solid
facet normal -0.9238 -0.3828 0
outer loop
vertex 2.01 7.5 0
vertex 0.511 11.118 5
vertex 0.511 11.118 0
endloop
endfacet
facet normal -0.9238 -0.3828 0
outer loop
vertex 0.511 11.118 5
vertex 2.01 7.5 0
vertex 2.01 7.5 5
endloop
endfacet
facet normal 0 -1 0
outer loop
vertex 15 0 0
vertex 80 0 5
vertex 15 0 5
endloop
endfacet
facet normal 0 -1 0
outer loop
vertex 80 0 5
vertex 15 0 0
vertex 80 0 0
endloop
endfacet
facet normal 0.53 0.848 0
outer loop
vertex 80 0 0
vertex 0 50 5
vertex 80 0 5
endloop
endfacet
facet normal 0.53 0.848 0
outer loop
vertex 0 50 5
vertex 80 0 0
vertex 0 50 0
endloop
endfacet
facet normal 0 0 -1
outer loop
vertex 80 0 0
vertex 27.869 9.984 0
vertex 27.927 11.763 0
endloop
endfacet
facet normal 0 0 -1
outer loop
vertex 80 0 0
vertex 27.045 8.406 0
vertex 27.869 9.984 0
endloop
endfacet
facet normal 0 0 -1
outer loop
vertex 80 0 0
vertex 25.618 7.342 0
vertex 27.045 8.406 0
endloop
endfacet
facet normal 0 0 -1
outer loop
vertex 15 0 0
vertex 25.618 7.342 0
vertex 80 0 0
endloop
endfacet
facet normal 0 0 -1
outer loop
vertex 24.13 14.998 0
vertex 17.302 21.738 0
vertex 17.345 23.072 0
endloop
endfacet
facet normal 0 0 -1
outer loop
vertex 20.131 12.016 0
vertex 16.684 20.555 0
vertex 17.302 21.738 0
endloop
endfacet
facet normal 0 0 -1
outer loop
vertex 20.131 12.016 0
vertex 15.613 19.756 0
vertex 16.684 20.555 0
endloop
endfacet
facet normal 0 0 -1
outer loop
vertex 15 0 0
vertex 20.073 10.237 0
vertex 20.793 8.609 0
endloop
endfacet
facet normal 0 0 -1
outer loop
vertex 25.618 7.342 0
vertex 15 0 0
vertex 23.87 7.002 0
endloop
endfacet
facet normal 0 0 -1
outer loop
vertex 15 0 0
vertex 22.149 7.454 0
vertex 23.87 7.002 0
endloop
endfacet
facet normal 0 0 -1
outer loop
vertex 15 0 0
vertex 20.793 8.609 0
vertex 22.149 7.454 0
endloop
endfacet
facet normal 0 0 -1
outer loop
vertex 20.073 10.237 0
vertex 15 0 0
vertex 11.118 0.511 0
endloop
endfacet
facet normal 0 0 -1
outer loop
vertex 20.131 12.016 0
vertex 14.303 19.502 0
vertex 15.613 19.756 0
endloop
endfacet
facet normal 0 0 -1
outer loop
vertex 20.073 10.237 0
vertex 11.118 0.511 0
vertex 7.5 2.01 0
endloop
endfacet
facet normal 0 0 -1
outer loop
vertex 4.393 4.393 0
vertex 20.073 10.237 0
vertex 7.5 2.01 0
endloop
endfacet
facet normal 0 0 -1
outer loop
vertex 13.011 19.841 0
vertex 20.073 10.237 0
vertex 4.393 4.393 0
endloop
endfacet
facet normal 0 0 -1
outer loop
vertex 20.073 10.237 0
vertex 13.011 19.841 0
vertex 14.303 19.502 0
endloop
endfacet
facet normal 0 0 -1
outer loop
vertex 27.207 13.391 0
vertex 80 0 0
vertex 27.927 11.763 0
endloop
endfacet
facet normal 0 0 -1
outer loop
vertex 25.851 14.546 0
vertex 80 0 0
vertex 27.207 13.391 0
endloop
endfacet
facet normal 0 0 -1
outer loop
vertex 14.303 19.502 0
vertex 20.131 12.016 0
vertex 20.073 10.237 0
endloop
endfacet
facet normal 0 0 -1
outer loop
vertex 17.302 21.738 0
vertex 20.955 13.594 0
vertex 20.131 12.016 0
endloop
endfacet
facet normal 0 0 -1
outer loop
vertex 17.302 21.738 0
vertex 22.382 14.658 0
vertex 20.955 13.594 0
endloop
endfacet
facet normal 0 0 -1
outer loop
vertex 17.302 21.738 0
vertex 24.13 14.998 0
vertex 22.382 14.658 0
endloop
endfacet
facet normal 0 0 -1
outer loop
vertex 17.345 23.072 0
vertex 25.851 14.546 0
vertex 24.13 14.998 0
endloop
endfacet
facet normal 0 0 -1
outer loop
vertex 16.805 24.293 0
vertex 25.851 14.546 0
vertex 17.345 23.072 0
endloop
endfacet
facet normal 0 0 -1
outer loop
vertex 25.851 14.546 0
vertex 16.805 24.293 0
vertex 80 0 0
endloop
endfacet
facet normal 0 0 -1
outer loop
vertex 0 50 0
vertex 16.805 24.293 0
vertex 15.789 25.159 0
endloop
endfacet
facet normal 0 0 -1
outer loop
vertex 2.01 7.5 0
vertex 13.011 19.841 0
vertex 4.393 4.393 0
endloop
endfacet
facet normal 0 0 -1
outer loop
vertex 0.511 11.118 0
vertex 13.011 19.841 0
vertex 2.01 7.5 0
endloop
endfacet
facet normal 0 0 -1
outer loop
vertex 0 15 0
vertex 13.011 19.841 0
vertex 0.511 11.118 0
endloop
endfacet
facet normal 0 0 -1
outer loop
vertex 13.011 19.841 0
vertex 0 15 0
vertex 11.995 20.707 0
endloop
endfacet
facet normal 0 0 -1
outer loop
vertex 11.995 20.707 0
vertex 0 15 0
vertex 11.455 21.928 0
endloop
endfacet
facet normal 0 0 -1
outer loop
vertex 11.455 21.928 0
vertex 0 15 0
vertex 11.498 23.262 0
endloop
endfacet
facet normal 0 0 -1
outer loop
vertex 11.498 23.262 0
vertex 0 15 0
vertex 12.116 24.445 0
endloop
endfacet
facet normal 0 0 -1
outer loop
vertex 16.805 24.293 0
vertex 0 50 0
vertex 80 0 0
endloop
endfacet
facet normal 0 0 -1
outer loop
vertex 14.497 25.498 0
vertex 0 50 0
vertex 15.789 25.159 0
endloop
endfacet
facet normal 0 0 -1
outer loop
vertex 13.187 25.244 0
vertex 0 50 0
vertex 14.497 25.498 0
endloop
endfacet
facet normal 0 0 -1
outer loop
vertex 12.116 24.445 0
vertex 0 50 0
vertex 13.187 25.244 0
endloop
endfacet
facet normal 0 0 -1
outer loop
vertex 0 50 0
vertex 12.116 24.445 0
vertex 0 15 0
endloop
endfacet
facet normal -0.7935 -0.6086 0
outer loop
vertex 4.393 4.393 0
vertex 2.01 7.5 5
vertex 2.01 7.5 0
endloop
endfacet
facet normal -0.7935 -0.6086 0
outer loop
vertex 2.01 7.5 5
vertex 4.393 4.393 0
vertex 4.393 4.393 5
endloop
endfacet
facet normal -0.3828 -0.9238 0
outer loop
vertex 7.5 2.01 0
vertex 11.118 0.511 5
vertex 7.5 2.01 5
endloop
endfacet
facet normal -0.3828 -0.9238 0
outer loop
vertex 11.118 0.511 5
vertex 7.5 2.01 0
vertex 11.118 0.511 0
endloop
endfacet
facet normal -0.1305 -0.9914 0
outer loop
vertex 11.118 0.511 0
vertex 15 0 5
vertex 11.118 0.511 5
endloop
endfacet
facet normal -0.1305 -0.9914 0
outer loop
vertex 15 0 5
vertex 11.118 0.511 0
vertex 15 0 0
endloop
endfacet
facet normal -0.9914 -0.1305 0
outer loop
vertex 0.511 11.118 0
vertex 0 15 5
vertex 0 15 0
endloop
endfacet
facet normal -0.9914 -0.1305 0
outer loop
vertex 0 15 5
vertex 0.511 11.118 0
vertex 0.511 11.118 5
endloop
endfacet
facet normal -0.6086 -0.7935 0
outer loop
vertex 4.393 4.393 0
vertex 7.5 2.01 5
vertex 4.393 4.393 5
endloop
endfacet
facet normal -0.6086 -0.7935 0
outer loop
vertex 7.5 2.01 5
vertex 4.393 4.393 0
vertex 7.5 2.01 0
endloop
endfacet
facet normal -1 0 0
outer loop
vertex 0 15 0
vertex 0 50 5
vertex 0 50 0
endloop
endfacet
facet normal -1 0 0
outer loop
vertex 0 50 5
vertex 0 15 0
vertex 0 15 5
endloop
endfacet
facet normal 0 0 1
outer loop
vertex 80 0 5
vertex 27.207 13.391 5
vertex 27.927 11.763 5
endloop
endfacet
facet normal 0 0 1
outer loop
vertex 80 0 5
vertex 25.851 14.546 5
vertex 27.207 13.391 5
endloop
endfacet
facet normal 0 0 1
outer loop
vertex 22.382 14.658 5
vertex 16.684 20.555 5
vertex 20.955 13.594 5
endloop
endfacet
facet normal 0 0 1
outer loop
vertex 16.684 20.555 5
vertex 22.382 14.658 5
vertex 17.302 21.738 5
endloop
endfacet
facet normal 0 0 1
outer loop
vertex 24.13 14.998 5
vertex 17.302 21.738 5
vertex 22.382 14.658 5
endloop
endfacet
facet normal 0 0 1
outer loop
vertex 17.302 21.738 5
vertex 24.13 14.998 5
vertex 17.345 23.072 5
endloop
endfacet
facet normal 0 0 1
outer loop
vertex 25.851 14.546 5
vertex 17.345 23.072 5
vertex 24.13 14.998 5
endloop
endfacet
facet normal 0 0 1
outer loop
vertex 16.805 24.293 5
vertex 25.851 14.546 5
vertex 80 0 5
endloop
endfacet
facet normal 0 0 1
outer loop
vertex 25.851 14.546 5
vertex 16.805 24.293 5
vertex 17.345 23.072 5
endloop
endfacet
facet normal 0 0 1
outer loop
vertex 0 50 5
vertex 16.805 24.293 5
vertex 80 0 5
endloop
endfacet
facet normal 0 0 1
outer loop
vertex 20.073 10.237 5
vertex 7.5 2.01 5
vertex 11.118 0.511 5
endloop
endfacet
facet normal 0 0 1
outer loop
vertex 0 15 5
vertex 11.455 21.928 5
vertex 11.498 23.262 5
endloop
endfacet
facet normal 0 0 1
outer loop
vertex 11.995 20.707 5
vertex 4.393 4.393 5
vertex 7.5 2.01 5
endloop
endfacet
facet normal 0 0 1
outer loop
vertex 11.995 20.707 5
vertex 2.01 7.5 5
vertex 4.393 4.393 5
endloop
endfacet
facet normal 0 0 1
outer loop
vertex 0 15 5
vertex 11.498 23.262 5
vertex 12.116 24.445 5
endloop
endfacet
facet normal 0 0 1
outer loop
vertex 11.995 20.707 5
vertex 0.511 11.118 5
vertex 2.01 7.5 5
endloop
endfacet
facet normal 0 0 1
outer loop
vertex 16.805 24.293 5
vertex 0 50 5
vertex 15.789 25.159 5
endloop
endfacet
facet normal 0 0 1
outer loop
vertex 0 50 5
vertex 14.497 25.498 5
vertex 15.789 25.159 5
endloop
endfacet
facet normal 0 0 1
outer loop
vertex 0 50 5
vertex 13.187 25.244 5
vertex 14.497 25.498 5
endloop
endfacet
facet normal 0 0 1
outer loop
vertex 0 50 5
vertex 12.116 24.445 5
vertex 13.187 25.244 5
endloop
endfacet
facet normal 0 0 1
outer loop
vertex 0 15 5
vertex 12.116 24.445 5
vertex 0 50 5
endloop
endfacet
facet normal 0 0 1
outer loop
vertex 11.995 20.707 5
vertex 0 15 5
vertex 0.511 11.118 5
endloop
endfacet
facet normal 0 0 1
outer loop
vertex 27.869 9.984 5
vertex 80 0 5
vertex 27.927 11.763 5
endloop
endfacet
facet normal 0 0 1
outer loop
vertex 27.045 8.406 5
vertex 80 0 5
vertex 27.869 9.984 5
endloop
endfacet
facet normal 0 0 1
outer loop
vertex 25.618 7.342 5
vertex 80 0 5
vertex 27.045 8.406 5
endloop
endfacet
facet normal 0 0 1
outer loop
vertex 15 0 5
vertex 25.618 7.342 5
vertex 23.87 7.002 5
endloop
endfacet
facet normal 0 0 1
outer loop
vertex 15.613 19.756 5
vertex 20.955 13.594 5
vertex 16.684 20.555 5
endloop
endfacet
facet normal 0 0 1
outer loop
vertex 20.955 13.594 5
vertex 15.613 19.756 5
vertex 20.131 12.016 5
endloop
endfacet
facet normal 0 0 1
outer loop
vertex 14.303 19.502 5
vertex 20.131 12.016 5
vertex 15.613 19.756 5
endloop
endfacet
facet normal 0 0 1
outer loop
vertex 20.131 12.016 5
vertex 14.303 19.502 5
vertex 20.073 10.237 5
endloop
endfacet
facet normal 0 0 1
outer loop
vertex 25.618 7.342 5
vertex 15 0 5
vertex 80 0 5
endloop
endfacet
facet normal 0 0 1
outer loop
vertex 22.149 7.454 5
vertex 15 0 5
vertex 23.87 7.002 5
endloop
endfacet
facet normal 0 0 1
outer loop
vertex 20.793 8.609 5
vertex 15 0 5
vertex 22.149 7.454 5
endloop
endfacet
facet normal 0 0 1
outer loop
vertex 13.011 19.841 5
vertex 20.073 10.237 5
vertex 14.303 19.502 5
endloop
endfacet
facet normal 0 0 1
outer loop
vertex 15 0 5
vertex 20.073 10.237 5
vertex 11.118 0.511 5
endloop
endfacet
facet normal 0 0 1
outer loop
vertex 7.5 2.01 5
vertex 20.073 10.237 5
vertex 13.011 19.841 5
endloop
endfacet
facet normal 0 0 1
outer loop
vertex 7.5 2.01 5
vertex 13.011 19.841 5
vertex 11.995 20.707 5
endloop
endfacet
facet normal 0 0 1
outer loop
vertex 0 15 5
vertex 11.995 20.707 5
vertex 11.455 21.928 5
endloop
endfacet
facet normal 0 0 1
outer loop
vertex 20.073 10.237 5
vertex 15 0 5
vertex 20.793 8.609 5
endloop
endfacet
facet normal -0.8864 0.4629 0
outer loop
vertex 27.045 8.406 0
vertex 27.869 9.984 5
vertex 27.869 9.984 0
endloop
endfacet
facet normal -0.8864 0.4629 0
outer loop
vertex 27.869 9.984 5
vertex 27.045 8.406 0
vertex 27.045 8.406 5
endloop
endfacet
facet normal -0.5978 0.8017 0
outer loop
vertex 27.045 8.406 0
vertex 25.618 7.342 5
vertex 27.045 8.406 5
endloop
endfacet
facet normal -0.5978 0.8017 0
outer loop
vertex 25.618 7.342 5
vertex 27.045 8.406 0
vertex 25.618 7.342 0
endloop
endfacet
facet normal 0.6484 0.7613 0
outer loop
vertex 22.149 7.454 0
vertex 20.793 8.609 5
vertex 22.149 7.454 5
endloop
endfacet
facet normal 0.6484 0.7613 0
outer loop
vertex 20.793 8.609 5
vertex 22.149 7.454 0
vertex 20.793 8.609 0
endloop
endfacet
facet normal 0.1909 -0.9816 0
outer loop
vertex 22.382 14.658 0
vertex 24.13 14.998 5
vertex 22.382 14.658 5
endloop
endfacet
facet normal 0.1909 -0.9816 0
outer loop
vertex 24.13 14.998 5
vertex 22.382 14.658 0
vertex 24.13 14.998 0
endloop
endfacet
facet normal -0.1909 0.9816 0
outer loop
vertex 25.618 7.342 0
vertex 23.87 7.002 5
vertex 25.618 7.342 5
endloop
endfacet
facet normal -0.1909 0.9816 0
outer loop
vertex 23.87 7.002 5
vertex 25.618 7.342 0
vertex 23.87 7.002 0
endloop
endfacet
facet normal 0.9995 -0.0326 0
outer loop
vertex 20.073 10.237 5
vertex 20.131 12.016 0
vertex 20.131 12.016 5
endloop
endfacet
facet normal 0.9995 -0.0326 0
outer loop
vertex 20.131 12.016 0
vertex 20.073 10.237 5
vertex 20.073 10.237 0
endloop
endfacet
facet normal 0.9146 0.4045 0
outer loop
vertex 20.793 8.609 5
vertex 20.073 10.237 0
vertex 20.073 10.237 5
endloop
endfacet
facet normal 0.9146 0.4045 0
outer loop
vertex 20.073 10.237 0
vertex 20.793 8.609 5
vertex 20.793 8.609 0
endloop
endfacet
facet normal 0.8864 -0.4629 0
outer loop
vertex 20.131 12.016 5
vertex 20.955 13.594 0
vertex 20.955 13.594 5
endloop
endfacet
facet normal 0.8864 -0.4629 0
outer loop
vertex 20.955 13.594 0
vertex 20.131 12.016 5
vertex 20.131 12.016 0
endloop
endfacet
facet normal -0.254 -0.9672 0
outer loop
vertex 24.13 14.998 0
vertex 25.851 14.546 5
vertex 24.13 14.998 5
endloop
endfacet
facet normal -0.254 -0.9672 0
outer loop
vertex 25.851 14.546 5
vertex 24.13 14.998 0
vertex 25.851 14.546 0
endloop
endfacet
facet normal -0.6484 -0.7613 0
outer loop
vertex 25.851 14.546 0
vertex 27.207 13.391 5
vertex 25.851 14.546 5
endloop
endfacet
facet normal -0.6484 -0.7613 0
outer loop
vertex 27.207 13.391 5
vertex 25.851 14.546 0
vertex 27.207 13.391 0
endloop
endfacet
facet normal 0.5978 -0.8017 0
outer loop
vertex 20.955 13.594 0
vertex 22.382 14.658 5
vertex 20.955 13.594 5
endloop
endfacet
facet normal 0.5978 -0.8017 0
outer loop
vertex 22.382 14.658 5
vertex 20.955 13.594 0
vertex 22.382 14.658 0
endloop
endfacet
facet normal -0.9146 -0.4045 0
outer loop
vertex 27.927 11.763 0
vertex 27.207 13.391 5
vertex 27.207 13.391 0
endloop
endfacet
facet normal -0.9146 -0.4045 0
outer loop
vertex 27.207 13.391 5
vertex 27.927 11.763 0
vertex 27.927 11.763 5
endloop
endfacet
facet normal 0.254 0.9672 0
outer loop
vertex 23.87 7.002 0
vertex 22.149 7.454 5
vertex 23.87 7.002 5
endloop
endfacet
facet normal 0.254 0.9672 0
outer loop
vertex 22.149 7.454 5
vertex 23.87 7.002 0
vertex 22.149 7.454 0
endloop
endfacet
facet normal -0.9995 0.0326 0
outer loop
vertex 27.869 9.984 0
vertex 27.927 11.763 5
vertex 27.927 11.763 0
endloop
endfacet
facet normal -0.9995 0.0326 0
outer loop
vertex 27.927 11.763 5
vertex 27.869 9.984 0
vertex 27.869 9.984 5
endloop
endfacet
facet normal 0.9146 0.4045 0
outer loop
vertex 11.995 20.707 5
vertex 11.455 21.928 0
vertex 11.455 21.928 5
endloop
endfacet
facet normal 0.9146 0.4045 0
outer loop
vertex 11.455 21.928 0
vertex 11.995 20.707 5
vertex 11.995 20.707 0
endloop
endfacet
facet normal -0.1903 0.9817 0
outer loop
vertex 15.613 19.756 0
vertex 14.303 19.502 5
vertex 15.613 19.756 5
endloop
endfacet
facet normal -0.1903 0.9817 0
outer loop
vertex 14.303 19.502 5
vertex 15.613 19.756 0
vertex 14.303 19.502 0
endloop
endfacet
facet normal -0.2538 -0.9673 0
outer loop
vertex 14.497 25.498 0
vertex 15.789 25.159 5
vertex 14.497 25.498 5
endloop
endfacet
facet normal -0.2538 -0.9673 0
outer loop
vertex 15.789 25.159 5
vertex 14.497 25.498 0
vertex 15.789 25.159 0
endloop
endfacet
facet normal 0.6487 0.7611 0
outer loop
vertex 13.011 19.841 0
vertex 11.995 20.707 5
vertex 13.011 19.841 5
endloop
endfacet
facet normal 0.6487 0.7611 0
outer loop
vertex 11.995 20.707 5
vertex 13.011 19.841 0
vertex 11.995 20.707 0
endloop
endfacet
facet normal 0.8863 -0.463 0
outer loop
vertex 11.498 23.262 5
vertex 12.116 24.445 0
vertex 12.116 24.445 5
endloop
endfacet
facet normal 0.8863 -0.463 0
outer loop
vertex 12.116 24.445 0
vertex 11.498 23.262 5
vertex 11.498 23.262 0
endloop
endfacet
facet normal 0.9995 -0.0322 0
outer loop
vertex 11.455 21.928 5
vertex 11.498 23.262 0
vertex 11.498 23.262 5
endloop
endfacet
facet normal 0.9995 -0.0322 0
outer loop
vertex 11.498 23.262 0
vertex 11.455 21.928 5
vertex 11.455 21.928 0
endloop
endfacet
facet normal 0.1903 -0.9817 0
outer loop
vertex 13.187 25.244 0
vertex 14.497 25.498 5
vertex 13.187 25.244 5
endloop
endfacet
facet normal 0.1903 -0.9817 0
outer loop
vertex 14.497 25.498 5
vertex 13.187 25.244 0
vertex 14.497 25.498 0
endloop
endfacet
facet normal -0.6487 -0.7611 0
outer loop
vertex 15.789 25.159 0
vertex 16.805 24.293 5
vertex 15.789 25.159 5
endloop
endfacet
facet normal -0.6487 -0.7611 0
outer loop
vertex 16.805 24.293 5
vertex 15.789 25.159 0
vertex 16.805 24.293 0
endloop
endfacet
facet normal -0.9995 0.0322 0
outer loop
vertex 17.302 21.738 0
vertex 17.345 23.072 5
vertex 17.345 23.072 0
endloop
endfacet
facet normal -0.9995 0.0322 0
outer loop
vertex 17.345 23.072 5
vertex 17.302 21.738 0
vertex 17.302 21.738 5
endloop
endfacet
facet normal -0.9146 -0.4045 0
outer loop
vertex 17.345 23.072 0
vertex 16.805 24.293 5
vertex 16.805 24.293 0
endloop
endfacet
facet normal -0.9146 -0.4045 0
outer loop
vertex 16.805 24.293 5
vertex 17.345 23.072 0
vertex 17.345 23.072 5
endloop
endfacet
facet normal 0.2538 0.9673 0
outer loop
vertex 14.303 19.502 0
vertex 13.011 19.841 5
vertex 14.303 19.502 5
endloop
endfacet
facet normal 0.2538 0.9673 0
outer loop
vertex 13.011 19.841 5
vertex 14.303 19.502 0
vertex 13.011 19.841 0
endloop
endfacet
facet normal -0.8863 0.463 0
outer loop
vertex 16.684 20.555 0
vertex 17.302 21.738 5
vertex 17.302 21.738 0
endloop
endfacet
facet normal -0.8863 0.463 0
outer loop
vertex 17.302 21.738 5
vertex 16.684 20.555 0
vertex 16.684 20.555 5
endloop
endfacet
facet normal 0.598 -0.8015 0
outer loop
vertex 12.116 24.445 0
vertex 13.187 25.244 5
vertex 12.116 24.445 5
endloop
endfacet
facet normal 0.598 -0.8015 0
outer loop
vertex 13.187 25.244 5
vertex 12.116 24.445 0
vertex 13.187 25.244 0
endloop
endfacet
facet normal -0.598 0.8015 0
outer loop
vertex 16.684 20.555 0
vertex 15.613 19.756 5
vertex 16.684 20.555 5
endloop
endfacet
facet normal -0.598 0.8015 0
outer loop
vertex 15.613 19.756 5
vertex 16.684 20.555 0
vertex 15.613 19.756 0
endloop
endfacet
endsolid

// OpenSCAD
$fn = 32;

// ----------------------------------------------------------------------
// Bracket plate: corner pad 80 x 50, fillet R15
// ----------------------------------------------------------------------

// --- parameters (mm) ---
hole_r = 3;               // bolt hole radius
plate_t = 5;              // plate thickness, Z (extrusion height)
leg_a = 80;               // base leg
leg_b = 50;               // height leg
fillet_r = 15;            // right-angle fillet radius

hole_d1 = 2 * hole_r + 2;
hole_d2 = 2 * hole_r;

profile = [[15, 0], [80, 0], [0, 50], [0, 15], [0.511, 11.118], [2.01, 7.5], [4.393, 4.393], [7.5, 2.01], [11.118, 0.511]];  // primary outline, 9 points, counter clockwise
void_1 = [[27.927, 11.763], [27.207, 13.391], [25.851, 14.546], [24.13, 14.998], [22.382, 14.658], [20.955, 13.594], [20.131, 12.016], [20.073, 10.237], [20.793, 8.609], [22.149, 7.454], [23.87, 7.002], [25.618, 7.342], [27.045, 8.406], [27.869, 9.984]];  // mount hole 1, 14 points
void_2 = [[17.345, 23.072], [16.805, 24.293], [15.789, 25.159], [14.497, 25.498], [13.187, 25.244], [12.116, 24.445], [11.498, 23.262], [11.455, 21.928], [11.995, 20.707], [13.011, 19.841], [14.303, 19.502], [15.613, 19.756], [16.684, 20.555], [17.302, 21.738]];  // mount hole 2, 14 points

// --- the one profile operation ---
difference() {
  linear_extrude(height = plate_t) polygon(points = profile);
  translate([0, 0, -1])
    linear_extrude(height = plate_t + 2) polygon(points = void_1);
  translate([0, 0, -1])
    linear_extrude(height = plate_t + 2) polygon(points = void_2);
}
